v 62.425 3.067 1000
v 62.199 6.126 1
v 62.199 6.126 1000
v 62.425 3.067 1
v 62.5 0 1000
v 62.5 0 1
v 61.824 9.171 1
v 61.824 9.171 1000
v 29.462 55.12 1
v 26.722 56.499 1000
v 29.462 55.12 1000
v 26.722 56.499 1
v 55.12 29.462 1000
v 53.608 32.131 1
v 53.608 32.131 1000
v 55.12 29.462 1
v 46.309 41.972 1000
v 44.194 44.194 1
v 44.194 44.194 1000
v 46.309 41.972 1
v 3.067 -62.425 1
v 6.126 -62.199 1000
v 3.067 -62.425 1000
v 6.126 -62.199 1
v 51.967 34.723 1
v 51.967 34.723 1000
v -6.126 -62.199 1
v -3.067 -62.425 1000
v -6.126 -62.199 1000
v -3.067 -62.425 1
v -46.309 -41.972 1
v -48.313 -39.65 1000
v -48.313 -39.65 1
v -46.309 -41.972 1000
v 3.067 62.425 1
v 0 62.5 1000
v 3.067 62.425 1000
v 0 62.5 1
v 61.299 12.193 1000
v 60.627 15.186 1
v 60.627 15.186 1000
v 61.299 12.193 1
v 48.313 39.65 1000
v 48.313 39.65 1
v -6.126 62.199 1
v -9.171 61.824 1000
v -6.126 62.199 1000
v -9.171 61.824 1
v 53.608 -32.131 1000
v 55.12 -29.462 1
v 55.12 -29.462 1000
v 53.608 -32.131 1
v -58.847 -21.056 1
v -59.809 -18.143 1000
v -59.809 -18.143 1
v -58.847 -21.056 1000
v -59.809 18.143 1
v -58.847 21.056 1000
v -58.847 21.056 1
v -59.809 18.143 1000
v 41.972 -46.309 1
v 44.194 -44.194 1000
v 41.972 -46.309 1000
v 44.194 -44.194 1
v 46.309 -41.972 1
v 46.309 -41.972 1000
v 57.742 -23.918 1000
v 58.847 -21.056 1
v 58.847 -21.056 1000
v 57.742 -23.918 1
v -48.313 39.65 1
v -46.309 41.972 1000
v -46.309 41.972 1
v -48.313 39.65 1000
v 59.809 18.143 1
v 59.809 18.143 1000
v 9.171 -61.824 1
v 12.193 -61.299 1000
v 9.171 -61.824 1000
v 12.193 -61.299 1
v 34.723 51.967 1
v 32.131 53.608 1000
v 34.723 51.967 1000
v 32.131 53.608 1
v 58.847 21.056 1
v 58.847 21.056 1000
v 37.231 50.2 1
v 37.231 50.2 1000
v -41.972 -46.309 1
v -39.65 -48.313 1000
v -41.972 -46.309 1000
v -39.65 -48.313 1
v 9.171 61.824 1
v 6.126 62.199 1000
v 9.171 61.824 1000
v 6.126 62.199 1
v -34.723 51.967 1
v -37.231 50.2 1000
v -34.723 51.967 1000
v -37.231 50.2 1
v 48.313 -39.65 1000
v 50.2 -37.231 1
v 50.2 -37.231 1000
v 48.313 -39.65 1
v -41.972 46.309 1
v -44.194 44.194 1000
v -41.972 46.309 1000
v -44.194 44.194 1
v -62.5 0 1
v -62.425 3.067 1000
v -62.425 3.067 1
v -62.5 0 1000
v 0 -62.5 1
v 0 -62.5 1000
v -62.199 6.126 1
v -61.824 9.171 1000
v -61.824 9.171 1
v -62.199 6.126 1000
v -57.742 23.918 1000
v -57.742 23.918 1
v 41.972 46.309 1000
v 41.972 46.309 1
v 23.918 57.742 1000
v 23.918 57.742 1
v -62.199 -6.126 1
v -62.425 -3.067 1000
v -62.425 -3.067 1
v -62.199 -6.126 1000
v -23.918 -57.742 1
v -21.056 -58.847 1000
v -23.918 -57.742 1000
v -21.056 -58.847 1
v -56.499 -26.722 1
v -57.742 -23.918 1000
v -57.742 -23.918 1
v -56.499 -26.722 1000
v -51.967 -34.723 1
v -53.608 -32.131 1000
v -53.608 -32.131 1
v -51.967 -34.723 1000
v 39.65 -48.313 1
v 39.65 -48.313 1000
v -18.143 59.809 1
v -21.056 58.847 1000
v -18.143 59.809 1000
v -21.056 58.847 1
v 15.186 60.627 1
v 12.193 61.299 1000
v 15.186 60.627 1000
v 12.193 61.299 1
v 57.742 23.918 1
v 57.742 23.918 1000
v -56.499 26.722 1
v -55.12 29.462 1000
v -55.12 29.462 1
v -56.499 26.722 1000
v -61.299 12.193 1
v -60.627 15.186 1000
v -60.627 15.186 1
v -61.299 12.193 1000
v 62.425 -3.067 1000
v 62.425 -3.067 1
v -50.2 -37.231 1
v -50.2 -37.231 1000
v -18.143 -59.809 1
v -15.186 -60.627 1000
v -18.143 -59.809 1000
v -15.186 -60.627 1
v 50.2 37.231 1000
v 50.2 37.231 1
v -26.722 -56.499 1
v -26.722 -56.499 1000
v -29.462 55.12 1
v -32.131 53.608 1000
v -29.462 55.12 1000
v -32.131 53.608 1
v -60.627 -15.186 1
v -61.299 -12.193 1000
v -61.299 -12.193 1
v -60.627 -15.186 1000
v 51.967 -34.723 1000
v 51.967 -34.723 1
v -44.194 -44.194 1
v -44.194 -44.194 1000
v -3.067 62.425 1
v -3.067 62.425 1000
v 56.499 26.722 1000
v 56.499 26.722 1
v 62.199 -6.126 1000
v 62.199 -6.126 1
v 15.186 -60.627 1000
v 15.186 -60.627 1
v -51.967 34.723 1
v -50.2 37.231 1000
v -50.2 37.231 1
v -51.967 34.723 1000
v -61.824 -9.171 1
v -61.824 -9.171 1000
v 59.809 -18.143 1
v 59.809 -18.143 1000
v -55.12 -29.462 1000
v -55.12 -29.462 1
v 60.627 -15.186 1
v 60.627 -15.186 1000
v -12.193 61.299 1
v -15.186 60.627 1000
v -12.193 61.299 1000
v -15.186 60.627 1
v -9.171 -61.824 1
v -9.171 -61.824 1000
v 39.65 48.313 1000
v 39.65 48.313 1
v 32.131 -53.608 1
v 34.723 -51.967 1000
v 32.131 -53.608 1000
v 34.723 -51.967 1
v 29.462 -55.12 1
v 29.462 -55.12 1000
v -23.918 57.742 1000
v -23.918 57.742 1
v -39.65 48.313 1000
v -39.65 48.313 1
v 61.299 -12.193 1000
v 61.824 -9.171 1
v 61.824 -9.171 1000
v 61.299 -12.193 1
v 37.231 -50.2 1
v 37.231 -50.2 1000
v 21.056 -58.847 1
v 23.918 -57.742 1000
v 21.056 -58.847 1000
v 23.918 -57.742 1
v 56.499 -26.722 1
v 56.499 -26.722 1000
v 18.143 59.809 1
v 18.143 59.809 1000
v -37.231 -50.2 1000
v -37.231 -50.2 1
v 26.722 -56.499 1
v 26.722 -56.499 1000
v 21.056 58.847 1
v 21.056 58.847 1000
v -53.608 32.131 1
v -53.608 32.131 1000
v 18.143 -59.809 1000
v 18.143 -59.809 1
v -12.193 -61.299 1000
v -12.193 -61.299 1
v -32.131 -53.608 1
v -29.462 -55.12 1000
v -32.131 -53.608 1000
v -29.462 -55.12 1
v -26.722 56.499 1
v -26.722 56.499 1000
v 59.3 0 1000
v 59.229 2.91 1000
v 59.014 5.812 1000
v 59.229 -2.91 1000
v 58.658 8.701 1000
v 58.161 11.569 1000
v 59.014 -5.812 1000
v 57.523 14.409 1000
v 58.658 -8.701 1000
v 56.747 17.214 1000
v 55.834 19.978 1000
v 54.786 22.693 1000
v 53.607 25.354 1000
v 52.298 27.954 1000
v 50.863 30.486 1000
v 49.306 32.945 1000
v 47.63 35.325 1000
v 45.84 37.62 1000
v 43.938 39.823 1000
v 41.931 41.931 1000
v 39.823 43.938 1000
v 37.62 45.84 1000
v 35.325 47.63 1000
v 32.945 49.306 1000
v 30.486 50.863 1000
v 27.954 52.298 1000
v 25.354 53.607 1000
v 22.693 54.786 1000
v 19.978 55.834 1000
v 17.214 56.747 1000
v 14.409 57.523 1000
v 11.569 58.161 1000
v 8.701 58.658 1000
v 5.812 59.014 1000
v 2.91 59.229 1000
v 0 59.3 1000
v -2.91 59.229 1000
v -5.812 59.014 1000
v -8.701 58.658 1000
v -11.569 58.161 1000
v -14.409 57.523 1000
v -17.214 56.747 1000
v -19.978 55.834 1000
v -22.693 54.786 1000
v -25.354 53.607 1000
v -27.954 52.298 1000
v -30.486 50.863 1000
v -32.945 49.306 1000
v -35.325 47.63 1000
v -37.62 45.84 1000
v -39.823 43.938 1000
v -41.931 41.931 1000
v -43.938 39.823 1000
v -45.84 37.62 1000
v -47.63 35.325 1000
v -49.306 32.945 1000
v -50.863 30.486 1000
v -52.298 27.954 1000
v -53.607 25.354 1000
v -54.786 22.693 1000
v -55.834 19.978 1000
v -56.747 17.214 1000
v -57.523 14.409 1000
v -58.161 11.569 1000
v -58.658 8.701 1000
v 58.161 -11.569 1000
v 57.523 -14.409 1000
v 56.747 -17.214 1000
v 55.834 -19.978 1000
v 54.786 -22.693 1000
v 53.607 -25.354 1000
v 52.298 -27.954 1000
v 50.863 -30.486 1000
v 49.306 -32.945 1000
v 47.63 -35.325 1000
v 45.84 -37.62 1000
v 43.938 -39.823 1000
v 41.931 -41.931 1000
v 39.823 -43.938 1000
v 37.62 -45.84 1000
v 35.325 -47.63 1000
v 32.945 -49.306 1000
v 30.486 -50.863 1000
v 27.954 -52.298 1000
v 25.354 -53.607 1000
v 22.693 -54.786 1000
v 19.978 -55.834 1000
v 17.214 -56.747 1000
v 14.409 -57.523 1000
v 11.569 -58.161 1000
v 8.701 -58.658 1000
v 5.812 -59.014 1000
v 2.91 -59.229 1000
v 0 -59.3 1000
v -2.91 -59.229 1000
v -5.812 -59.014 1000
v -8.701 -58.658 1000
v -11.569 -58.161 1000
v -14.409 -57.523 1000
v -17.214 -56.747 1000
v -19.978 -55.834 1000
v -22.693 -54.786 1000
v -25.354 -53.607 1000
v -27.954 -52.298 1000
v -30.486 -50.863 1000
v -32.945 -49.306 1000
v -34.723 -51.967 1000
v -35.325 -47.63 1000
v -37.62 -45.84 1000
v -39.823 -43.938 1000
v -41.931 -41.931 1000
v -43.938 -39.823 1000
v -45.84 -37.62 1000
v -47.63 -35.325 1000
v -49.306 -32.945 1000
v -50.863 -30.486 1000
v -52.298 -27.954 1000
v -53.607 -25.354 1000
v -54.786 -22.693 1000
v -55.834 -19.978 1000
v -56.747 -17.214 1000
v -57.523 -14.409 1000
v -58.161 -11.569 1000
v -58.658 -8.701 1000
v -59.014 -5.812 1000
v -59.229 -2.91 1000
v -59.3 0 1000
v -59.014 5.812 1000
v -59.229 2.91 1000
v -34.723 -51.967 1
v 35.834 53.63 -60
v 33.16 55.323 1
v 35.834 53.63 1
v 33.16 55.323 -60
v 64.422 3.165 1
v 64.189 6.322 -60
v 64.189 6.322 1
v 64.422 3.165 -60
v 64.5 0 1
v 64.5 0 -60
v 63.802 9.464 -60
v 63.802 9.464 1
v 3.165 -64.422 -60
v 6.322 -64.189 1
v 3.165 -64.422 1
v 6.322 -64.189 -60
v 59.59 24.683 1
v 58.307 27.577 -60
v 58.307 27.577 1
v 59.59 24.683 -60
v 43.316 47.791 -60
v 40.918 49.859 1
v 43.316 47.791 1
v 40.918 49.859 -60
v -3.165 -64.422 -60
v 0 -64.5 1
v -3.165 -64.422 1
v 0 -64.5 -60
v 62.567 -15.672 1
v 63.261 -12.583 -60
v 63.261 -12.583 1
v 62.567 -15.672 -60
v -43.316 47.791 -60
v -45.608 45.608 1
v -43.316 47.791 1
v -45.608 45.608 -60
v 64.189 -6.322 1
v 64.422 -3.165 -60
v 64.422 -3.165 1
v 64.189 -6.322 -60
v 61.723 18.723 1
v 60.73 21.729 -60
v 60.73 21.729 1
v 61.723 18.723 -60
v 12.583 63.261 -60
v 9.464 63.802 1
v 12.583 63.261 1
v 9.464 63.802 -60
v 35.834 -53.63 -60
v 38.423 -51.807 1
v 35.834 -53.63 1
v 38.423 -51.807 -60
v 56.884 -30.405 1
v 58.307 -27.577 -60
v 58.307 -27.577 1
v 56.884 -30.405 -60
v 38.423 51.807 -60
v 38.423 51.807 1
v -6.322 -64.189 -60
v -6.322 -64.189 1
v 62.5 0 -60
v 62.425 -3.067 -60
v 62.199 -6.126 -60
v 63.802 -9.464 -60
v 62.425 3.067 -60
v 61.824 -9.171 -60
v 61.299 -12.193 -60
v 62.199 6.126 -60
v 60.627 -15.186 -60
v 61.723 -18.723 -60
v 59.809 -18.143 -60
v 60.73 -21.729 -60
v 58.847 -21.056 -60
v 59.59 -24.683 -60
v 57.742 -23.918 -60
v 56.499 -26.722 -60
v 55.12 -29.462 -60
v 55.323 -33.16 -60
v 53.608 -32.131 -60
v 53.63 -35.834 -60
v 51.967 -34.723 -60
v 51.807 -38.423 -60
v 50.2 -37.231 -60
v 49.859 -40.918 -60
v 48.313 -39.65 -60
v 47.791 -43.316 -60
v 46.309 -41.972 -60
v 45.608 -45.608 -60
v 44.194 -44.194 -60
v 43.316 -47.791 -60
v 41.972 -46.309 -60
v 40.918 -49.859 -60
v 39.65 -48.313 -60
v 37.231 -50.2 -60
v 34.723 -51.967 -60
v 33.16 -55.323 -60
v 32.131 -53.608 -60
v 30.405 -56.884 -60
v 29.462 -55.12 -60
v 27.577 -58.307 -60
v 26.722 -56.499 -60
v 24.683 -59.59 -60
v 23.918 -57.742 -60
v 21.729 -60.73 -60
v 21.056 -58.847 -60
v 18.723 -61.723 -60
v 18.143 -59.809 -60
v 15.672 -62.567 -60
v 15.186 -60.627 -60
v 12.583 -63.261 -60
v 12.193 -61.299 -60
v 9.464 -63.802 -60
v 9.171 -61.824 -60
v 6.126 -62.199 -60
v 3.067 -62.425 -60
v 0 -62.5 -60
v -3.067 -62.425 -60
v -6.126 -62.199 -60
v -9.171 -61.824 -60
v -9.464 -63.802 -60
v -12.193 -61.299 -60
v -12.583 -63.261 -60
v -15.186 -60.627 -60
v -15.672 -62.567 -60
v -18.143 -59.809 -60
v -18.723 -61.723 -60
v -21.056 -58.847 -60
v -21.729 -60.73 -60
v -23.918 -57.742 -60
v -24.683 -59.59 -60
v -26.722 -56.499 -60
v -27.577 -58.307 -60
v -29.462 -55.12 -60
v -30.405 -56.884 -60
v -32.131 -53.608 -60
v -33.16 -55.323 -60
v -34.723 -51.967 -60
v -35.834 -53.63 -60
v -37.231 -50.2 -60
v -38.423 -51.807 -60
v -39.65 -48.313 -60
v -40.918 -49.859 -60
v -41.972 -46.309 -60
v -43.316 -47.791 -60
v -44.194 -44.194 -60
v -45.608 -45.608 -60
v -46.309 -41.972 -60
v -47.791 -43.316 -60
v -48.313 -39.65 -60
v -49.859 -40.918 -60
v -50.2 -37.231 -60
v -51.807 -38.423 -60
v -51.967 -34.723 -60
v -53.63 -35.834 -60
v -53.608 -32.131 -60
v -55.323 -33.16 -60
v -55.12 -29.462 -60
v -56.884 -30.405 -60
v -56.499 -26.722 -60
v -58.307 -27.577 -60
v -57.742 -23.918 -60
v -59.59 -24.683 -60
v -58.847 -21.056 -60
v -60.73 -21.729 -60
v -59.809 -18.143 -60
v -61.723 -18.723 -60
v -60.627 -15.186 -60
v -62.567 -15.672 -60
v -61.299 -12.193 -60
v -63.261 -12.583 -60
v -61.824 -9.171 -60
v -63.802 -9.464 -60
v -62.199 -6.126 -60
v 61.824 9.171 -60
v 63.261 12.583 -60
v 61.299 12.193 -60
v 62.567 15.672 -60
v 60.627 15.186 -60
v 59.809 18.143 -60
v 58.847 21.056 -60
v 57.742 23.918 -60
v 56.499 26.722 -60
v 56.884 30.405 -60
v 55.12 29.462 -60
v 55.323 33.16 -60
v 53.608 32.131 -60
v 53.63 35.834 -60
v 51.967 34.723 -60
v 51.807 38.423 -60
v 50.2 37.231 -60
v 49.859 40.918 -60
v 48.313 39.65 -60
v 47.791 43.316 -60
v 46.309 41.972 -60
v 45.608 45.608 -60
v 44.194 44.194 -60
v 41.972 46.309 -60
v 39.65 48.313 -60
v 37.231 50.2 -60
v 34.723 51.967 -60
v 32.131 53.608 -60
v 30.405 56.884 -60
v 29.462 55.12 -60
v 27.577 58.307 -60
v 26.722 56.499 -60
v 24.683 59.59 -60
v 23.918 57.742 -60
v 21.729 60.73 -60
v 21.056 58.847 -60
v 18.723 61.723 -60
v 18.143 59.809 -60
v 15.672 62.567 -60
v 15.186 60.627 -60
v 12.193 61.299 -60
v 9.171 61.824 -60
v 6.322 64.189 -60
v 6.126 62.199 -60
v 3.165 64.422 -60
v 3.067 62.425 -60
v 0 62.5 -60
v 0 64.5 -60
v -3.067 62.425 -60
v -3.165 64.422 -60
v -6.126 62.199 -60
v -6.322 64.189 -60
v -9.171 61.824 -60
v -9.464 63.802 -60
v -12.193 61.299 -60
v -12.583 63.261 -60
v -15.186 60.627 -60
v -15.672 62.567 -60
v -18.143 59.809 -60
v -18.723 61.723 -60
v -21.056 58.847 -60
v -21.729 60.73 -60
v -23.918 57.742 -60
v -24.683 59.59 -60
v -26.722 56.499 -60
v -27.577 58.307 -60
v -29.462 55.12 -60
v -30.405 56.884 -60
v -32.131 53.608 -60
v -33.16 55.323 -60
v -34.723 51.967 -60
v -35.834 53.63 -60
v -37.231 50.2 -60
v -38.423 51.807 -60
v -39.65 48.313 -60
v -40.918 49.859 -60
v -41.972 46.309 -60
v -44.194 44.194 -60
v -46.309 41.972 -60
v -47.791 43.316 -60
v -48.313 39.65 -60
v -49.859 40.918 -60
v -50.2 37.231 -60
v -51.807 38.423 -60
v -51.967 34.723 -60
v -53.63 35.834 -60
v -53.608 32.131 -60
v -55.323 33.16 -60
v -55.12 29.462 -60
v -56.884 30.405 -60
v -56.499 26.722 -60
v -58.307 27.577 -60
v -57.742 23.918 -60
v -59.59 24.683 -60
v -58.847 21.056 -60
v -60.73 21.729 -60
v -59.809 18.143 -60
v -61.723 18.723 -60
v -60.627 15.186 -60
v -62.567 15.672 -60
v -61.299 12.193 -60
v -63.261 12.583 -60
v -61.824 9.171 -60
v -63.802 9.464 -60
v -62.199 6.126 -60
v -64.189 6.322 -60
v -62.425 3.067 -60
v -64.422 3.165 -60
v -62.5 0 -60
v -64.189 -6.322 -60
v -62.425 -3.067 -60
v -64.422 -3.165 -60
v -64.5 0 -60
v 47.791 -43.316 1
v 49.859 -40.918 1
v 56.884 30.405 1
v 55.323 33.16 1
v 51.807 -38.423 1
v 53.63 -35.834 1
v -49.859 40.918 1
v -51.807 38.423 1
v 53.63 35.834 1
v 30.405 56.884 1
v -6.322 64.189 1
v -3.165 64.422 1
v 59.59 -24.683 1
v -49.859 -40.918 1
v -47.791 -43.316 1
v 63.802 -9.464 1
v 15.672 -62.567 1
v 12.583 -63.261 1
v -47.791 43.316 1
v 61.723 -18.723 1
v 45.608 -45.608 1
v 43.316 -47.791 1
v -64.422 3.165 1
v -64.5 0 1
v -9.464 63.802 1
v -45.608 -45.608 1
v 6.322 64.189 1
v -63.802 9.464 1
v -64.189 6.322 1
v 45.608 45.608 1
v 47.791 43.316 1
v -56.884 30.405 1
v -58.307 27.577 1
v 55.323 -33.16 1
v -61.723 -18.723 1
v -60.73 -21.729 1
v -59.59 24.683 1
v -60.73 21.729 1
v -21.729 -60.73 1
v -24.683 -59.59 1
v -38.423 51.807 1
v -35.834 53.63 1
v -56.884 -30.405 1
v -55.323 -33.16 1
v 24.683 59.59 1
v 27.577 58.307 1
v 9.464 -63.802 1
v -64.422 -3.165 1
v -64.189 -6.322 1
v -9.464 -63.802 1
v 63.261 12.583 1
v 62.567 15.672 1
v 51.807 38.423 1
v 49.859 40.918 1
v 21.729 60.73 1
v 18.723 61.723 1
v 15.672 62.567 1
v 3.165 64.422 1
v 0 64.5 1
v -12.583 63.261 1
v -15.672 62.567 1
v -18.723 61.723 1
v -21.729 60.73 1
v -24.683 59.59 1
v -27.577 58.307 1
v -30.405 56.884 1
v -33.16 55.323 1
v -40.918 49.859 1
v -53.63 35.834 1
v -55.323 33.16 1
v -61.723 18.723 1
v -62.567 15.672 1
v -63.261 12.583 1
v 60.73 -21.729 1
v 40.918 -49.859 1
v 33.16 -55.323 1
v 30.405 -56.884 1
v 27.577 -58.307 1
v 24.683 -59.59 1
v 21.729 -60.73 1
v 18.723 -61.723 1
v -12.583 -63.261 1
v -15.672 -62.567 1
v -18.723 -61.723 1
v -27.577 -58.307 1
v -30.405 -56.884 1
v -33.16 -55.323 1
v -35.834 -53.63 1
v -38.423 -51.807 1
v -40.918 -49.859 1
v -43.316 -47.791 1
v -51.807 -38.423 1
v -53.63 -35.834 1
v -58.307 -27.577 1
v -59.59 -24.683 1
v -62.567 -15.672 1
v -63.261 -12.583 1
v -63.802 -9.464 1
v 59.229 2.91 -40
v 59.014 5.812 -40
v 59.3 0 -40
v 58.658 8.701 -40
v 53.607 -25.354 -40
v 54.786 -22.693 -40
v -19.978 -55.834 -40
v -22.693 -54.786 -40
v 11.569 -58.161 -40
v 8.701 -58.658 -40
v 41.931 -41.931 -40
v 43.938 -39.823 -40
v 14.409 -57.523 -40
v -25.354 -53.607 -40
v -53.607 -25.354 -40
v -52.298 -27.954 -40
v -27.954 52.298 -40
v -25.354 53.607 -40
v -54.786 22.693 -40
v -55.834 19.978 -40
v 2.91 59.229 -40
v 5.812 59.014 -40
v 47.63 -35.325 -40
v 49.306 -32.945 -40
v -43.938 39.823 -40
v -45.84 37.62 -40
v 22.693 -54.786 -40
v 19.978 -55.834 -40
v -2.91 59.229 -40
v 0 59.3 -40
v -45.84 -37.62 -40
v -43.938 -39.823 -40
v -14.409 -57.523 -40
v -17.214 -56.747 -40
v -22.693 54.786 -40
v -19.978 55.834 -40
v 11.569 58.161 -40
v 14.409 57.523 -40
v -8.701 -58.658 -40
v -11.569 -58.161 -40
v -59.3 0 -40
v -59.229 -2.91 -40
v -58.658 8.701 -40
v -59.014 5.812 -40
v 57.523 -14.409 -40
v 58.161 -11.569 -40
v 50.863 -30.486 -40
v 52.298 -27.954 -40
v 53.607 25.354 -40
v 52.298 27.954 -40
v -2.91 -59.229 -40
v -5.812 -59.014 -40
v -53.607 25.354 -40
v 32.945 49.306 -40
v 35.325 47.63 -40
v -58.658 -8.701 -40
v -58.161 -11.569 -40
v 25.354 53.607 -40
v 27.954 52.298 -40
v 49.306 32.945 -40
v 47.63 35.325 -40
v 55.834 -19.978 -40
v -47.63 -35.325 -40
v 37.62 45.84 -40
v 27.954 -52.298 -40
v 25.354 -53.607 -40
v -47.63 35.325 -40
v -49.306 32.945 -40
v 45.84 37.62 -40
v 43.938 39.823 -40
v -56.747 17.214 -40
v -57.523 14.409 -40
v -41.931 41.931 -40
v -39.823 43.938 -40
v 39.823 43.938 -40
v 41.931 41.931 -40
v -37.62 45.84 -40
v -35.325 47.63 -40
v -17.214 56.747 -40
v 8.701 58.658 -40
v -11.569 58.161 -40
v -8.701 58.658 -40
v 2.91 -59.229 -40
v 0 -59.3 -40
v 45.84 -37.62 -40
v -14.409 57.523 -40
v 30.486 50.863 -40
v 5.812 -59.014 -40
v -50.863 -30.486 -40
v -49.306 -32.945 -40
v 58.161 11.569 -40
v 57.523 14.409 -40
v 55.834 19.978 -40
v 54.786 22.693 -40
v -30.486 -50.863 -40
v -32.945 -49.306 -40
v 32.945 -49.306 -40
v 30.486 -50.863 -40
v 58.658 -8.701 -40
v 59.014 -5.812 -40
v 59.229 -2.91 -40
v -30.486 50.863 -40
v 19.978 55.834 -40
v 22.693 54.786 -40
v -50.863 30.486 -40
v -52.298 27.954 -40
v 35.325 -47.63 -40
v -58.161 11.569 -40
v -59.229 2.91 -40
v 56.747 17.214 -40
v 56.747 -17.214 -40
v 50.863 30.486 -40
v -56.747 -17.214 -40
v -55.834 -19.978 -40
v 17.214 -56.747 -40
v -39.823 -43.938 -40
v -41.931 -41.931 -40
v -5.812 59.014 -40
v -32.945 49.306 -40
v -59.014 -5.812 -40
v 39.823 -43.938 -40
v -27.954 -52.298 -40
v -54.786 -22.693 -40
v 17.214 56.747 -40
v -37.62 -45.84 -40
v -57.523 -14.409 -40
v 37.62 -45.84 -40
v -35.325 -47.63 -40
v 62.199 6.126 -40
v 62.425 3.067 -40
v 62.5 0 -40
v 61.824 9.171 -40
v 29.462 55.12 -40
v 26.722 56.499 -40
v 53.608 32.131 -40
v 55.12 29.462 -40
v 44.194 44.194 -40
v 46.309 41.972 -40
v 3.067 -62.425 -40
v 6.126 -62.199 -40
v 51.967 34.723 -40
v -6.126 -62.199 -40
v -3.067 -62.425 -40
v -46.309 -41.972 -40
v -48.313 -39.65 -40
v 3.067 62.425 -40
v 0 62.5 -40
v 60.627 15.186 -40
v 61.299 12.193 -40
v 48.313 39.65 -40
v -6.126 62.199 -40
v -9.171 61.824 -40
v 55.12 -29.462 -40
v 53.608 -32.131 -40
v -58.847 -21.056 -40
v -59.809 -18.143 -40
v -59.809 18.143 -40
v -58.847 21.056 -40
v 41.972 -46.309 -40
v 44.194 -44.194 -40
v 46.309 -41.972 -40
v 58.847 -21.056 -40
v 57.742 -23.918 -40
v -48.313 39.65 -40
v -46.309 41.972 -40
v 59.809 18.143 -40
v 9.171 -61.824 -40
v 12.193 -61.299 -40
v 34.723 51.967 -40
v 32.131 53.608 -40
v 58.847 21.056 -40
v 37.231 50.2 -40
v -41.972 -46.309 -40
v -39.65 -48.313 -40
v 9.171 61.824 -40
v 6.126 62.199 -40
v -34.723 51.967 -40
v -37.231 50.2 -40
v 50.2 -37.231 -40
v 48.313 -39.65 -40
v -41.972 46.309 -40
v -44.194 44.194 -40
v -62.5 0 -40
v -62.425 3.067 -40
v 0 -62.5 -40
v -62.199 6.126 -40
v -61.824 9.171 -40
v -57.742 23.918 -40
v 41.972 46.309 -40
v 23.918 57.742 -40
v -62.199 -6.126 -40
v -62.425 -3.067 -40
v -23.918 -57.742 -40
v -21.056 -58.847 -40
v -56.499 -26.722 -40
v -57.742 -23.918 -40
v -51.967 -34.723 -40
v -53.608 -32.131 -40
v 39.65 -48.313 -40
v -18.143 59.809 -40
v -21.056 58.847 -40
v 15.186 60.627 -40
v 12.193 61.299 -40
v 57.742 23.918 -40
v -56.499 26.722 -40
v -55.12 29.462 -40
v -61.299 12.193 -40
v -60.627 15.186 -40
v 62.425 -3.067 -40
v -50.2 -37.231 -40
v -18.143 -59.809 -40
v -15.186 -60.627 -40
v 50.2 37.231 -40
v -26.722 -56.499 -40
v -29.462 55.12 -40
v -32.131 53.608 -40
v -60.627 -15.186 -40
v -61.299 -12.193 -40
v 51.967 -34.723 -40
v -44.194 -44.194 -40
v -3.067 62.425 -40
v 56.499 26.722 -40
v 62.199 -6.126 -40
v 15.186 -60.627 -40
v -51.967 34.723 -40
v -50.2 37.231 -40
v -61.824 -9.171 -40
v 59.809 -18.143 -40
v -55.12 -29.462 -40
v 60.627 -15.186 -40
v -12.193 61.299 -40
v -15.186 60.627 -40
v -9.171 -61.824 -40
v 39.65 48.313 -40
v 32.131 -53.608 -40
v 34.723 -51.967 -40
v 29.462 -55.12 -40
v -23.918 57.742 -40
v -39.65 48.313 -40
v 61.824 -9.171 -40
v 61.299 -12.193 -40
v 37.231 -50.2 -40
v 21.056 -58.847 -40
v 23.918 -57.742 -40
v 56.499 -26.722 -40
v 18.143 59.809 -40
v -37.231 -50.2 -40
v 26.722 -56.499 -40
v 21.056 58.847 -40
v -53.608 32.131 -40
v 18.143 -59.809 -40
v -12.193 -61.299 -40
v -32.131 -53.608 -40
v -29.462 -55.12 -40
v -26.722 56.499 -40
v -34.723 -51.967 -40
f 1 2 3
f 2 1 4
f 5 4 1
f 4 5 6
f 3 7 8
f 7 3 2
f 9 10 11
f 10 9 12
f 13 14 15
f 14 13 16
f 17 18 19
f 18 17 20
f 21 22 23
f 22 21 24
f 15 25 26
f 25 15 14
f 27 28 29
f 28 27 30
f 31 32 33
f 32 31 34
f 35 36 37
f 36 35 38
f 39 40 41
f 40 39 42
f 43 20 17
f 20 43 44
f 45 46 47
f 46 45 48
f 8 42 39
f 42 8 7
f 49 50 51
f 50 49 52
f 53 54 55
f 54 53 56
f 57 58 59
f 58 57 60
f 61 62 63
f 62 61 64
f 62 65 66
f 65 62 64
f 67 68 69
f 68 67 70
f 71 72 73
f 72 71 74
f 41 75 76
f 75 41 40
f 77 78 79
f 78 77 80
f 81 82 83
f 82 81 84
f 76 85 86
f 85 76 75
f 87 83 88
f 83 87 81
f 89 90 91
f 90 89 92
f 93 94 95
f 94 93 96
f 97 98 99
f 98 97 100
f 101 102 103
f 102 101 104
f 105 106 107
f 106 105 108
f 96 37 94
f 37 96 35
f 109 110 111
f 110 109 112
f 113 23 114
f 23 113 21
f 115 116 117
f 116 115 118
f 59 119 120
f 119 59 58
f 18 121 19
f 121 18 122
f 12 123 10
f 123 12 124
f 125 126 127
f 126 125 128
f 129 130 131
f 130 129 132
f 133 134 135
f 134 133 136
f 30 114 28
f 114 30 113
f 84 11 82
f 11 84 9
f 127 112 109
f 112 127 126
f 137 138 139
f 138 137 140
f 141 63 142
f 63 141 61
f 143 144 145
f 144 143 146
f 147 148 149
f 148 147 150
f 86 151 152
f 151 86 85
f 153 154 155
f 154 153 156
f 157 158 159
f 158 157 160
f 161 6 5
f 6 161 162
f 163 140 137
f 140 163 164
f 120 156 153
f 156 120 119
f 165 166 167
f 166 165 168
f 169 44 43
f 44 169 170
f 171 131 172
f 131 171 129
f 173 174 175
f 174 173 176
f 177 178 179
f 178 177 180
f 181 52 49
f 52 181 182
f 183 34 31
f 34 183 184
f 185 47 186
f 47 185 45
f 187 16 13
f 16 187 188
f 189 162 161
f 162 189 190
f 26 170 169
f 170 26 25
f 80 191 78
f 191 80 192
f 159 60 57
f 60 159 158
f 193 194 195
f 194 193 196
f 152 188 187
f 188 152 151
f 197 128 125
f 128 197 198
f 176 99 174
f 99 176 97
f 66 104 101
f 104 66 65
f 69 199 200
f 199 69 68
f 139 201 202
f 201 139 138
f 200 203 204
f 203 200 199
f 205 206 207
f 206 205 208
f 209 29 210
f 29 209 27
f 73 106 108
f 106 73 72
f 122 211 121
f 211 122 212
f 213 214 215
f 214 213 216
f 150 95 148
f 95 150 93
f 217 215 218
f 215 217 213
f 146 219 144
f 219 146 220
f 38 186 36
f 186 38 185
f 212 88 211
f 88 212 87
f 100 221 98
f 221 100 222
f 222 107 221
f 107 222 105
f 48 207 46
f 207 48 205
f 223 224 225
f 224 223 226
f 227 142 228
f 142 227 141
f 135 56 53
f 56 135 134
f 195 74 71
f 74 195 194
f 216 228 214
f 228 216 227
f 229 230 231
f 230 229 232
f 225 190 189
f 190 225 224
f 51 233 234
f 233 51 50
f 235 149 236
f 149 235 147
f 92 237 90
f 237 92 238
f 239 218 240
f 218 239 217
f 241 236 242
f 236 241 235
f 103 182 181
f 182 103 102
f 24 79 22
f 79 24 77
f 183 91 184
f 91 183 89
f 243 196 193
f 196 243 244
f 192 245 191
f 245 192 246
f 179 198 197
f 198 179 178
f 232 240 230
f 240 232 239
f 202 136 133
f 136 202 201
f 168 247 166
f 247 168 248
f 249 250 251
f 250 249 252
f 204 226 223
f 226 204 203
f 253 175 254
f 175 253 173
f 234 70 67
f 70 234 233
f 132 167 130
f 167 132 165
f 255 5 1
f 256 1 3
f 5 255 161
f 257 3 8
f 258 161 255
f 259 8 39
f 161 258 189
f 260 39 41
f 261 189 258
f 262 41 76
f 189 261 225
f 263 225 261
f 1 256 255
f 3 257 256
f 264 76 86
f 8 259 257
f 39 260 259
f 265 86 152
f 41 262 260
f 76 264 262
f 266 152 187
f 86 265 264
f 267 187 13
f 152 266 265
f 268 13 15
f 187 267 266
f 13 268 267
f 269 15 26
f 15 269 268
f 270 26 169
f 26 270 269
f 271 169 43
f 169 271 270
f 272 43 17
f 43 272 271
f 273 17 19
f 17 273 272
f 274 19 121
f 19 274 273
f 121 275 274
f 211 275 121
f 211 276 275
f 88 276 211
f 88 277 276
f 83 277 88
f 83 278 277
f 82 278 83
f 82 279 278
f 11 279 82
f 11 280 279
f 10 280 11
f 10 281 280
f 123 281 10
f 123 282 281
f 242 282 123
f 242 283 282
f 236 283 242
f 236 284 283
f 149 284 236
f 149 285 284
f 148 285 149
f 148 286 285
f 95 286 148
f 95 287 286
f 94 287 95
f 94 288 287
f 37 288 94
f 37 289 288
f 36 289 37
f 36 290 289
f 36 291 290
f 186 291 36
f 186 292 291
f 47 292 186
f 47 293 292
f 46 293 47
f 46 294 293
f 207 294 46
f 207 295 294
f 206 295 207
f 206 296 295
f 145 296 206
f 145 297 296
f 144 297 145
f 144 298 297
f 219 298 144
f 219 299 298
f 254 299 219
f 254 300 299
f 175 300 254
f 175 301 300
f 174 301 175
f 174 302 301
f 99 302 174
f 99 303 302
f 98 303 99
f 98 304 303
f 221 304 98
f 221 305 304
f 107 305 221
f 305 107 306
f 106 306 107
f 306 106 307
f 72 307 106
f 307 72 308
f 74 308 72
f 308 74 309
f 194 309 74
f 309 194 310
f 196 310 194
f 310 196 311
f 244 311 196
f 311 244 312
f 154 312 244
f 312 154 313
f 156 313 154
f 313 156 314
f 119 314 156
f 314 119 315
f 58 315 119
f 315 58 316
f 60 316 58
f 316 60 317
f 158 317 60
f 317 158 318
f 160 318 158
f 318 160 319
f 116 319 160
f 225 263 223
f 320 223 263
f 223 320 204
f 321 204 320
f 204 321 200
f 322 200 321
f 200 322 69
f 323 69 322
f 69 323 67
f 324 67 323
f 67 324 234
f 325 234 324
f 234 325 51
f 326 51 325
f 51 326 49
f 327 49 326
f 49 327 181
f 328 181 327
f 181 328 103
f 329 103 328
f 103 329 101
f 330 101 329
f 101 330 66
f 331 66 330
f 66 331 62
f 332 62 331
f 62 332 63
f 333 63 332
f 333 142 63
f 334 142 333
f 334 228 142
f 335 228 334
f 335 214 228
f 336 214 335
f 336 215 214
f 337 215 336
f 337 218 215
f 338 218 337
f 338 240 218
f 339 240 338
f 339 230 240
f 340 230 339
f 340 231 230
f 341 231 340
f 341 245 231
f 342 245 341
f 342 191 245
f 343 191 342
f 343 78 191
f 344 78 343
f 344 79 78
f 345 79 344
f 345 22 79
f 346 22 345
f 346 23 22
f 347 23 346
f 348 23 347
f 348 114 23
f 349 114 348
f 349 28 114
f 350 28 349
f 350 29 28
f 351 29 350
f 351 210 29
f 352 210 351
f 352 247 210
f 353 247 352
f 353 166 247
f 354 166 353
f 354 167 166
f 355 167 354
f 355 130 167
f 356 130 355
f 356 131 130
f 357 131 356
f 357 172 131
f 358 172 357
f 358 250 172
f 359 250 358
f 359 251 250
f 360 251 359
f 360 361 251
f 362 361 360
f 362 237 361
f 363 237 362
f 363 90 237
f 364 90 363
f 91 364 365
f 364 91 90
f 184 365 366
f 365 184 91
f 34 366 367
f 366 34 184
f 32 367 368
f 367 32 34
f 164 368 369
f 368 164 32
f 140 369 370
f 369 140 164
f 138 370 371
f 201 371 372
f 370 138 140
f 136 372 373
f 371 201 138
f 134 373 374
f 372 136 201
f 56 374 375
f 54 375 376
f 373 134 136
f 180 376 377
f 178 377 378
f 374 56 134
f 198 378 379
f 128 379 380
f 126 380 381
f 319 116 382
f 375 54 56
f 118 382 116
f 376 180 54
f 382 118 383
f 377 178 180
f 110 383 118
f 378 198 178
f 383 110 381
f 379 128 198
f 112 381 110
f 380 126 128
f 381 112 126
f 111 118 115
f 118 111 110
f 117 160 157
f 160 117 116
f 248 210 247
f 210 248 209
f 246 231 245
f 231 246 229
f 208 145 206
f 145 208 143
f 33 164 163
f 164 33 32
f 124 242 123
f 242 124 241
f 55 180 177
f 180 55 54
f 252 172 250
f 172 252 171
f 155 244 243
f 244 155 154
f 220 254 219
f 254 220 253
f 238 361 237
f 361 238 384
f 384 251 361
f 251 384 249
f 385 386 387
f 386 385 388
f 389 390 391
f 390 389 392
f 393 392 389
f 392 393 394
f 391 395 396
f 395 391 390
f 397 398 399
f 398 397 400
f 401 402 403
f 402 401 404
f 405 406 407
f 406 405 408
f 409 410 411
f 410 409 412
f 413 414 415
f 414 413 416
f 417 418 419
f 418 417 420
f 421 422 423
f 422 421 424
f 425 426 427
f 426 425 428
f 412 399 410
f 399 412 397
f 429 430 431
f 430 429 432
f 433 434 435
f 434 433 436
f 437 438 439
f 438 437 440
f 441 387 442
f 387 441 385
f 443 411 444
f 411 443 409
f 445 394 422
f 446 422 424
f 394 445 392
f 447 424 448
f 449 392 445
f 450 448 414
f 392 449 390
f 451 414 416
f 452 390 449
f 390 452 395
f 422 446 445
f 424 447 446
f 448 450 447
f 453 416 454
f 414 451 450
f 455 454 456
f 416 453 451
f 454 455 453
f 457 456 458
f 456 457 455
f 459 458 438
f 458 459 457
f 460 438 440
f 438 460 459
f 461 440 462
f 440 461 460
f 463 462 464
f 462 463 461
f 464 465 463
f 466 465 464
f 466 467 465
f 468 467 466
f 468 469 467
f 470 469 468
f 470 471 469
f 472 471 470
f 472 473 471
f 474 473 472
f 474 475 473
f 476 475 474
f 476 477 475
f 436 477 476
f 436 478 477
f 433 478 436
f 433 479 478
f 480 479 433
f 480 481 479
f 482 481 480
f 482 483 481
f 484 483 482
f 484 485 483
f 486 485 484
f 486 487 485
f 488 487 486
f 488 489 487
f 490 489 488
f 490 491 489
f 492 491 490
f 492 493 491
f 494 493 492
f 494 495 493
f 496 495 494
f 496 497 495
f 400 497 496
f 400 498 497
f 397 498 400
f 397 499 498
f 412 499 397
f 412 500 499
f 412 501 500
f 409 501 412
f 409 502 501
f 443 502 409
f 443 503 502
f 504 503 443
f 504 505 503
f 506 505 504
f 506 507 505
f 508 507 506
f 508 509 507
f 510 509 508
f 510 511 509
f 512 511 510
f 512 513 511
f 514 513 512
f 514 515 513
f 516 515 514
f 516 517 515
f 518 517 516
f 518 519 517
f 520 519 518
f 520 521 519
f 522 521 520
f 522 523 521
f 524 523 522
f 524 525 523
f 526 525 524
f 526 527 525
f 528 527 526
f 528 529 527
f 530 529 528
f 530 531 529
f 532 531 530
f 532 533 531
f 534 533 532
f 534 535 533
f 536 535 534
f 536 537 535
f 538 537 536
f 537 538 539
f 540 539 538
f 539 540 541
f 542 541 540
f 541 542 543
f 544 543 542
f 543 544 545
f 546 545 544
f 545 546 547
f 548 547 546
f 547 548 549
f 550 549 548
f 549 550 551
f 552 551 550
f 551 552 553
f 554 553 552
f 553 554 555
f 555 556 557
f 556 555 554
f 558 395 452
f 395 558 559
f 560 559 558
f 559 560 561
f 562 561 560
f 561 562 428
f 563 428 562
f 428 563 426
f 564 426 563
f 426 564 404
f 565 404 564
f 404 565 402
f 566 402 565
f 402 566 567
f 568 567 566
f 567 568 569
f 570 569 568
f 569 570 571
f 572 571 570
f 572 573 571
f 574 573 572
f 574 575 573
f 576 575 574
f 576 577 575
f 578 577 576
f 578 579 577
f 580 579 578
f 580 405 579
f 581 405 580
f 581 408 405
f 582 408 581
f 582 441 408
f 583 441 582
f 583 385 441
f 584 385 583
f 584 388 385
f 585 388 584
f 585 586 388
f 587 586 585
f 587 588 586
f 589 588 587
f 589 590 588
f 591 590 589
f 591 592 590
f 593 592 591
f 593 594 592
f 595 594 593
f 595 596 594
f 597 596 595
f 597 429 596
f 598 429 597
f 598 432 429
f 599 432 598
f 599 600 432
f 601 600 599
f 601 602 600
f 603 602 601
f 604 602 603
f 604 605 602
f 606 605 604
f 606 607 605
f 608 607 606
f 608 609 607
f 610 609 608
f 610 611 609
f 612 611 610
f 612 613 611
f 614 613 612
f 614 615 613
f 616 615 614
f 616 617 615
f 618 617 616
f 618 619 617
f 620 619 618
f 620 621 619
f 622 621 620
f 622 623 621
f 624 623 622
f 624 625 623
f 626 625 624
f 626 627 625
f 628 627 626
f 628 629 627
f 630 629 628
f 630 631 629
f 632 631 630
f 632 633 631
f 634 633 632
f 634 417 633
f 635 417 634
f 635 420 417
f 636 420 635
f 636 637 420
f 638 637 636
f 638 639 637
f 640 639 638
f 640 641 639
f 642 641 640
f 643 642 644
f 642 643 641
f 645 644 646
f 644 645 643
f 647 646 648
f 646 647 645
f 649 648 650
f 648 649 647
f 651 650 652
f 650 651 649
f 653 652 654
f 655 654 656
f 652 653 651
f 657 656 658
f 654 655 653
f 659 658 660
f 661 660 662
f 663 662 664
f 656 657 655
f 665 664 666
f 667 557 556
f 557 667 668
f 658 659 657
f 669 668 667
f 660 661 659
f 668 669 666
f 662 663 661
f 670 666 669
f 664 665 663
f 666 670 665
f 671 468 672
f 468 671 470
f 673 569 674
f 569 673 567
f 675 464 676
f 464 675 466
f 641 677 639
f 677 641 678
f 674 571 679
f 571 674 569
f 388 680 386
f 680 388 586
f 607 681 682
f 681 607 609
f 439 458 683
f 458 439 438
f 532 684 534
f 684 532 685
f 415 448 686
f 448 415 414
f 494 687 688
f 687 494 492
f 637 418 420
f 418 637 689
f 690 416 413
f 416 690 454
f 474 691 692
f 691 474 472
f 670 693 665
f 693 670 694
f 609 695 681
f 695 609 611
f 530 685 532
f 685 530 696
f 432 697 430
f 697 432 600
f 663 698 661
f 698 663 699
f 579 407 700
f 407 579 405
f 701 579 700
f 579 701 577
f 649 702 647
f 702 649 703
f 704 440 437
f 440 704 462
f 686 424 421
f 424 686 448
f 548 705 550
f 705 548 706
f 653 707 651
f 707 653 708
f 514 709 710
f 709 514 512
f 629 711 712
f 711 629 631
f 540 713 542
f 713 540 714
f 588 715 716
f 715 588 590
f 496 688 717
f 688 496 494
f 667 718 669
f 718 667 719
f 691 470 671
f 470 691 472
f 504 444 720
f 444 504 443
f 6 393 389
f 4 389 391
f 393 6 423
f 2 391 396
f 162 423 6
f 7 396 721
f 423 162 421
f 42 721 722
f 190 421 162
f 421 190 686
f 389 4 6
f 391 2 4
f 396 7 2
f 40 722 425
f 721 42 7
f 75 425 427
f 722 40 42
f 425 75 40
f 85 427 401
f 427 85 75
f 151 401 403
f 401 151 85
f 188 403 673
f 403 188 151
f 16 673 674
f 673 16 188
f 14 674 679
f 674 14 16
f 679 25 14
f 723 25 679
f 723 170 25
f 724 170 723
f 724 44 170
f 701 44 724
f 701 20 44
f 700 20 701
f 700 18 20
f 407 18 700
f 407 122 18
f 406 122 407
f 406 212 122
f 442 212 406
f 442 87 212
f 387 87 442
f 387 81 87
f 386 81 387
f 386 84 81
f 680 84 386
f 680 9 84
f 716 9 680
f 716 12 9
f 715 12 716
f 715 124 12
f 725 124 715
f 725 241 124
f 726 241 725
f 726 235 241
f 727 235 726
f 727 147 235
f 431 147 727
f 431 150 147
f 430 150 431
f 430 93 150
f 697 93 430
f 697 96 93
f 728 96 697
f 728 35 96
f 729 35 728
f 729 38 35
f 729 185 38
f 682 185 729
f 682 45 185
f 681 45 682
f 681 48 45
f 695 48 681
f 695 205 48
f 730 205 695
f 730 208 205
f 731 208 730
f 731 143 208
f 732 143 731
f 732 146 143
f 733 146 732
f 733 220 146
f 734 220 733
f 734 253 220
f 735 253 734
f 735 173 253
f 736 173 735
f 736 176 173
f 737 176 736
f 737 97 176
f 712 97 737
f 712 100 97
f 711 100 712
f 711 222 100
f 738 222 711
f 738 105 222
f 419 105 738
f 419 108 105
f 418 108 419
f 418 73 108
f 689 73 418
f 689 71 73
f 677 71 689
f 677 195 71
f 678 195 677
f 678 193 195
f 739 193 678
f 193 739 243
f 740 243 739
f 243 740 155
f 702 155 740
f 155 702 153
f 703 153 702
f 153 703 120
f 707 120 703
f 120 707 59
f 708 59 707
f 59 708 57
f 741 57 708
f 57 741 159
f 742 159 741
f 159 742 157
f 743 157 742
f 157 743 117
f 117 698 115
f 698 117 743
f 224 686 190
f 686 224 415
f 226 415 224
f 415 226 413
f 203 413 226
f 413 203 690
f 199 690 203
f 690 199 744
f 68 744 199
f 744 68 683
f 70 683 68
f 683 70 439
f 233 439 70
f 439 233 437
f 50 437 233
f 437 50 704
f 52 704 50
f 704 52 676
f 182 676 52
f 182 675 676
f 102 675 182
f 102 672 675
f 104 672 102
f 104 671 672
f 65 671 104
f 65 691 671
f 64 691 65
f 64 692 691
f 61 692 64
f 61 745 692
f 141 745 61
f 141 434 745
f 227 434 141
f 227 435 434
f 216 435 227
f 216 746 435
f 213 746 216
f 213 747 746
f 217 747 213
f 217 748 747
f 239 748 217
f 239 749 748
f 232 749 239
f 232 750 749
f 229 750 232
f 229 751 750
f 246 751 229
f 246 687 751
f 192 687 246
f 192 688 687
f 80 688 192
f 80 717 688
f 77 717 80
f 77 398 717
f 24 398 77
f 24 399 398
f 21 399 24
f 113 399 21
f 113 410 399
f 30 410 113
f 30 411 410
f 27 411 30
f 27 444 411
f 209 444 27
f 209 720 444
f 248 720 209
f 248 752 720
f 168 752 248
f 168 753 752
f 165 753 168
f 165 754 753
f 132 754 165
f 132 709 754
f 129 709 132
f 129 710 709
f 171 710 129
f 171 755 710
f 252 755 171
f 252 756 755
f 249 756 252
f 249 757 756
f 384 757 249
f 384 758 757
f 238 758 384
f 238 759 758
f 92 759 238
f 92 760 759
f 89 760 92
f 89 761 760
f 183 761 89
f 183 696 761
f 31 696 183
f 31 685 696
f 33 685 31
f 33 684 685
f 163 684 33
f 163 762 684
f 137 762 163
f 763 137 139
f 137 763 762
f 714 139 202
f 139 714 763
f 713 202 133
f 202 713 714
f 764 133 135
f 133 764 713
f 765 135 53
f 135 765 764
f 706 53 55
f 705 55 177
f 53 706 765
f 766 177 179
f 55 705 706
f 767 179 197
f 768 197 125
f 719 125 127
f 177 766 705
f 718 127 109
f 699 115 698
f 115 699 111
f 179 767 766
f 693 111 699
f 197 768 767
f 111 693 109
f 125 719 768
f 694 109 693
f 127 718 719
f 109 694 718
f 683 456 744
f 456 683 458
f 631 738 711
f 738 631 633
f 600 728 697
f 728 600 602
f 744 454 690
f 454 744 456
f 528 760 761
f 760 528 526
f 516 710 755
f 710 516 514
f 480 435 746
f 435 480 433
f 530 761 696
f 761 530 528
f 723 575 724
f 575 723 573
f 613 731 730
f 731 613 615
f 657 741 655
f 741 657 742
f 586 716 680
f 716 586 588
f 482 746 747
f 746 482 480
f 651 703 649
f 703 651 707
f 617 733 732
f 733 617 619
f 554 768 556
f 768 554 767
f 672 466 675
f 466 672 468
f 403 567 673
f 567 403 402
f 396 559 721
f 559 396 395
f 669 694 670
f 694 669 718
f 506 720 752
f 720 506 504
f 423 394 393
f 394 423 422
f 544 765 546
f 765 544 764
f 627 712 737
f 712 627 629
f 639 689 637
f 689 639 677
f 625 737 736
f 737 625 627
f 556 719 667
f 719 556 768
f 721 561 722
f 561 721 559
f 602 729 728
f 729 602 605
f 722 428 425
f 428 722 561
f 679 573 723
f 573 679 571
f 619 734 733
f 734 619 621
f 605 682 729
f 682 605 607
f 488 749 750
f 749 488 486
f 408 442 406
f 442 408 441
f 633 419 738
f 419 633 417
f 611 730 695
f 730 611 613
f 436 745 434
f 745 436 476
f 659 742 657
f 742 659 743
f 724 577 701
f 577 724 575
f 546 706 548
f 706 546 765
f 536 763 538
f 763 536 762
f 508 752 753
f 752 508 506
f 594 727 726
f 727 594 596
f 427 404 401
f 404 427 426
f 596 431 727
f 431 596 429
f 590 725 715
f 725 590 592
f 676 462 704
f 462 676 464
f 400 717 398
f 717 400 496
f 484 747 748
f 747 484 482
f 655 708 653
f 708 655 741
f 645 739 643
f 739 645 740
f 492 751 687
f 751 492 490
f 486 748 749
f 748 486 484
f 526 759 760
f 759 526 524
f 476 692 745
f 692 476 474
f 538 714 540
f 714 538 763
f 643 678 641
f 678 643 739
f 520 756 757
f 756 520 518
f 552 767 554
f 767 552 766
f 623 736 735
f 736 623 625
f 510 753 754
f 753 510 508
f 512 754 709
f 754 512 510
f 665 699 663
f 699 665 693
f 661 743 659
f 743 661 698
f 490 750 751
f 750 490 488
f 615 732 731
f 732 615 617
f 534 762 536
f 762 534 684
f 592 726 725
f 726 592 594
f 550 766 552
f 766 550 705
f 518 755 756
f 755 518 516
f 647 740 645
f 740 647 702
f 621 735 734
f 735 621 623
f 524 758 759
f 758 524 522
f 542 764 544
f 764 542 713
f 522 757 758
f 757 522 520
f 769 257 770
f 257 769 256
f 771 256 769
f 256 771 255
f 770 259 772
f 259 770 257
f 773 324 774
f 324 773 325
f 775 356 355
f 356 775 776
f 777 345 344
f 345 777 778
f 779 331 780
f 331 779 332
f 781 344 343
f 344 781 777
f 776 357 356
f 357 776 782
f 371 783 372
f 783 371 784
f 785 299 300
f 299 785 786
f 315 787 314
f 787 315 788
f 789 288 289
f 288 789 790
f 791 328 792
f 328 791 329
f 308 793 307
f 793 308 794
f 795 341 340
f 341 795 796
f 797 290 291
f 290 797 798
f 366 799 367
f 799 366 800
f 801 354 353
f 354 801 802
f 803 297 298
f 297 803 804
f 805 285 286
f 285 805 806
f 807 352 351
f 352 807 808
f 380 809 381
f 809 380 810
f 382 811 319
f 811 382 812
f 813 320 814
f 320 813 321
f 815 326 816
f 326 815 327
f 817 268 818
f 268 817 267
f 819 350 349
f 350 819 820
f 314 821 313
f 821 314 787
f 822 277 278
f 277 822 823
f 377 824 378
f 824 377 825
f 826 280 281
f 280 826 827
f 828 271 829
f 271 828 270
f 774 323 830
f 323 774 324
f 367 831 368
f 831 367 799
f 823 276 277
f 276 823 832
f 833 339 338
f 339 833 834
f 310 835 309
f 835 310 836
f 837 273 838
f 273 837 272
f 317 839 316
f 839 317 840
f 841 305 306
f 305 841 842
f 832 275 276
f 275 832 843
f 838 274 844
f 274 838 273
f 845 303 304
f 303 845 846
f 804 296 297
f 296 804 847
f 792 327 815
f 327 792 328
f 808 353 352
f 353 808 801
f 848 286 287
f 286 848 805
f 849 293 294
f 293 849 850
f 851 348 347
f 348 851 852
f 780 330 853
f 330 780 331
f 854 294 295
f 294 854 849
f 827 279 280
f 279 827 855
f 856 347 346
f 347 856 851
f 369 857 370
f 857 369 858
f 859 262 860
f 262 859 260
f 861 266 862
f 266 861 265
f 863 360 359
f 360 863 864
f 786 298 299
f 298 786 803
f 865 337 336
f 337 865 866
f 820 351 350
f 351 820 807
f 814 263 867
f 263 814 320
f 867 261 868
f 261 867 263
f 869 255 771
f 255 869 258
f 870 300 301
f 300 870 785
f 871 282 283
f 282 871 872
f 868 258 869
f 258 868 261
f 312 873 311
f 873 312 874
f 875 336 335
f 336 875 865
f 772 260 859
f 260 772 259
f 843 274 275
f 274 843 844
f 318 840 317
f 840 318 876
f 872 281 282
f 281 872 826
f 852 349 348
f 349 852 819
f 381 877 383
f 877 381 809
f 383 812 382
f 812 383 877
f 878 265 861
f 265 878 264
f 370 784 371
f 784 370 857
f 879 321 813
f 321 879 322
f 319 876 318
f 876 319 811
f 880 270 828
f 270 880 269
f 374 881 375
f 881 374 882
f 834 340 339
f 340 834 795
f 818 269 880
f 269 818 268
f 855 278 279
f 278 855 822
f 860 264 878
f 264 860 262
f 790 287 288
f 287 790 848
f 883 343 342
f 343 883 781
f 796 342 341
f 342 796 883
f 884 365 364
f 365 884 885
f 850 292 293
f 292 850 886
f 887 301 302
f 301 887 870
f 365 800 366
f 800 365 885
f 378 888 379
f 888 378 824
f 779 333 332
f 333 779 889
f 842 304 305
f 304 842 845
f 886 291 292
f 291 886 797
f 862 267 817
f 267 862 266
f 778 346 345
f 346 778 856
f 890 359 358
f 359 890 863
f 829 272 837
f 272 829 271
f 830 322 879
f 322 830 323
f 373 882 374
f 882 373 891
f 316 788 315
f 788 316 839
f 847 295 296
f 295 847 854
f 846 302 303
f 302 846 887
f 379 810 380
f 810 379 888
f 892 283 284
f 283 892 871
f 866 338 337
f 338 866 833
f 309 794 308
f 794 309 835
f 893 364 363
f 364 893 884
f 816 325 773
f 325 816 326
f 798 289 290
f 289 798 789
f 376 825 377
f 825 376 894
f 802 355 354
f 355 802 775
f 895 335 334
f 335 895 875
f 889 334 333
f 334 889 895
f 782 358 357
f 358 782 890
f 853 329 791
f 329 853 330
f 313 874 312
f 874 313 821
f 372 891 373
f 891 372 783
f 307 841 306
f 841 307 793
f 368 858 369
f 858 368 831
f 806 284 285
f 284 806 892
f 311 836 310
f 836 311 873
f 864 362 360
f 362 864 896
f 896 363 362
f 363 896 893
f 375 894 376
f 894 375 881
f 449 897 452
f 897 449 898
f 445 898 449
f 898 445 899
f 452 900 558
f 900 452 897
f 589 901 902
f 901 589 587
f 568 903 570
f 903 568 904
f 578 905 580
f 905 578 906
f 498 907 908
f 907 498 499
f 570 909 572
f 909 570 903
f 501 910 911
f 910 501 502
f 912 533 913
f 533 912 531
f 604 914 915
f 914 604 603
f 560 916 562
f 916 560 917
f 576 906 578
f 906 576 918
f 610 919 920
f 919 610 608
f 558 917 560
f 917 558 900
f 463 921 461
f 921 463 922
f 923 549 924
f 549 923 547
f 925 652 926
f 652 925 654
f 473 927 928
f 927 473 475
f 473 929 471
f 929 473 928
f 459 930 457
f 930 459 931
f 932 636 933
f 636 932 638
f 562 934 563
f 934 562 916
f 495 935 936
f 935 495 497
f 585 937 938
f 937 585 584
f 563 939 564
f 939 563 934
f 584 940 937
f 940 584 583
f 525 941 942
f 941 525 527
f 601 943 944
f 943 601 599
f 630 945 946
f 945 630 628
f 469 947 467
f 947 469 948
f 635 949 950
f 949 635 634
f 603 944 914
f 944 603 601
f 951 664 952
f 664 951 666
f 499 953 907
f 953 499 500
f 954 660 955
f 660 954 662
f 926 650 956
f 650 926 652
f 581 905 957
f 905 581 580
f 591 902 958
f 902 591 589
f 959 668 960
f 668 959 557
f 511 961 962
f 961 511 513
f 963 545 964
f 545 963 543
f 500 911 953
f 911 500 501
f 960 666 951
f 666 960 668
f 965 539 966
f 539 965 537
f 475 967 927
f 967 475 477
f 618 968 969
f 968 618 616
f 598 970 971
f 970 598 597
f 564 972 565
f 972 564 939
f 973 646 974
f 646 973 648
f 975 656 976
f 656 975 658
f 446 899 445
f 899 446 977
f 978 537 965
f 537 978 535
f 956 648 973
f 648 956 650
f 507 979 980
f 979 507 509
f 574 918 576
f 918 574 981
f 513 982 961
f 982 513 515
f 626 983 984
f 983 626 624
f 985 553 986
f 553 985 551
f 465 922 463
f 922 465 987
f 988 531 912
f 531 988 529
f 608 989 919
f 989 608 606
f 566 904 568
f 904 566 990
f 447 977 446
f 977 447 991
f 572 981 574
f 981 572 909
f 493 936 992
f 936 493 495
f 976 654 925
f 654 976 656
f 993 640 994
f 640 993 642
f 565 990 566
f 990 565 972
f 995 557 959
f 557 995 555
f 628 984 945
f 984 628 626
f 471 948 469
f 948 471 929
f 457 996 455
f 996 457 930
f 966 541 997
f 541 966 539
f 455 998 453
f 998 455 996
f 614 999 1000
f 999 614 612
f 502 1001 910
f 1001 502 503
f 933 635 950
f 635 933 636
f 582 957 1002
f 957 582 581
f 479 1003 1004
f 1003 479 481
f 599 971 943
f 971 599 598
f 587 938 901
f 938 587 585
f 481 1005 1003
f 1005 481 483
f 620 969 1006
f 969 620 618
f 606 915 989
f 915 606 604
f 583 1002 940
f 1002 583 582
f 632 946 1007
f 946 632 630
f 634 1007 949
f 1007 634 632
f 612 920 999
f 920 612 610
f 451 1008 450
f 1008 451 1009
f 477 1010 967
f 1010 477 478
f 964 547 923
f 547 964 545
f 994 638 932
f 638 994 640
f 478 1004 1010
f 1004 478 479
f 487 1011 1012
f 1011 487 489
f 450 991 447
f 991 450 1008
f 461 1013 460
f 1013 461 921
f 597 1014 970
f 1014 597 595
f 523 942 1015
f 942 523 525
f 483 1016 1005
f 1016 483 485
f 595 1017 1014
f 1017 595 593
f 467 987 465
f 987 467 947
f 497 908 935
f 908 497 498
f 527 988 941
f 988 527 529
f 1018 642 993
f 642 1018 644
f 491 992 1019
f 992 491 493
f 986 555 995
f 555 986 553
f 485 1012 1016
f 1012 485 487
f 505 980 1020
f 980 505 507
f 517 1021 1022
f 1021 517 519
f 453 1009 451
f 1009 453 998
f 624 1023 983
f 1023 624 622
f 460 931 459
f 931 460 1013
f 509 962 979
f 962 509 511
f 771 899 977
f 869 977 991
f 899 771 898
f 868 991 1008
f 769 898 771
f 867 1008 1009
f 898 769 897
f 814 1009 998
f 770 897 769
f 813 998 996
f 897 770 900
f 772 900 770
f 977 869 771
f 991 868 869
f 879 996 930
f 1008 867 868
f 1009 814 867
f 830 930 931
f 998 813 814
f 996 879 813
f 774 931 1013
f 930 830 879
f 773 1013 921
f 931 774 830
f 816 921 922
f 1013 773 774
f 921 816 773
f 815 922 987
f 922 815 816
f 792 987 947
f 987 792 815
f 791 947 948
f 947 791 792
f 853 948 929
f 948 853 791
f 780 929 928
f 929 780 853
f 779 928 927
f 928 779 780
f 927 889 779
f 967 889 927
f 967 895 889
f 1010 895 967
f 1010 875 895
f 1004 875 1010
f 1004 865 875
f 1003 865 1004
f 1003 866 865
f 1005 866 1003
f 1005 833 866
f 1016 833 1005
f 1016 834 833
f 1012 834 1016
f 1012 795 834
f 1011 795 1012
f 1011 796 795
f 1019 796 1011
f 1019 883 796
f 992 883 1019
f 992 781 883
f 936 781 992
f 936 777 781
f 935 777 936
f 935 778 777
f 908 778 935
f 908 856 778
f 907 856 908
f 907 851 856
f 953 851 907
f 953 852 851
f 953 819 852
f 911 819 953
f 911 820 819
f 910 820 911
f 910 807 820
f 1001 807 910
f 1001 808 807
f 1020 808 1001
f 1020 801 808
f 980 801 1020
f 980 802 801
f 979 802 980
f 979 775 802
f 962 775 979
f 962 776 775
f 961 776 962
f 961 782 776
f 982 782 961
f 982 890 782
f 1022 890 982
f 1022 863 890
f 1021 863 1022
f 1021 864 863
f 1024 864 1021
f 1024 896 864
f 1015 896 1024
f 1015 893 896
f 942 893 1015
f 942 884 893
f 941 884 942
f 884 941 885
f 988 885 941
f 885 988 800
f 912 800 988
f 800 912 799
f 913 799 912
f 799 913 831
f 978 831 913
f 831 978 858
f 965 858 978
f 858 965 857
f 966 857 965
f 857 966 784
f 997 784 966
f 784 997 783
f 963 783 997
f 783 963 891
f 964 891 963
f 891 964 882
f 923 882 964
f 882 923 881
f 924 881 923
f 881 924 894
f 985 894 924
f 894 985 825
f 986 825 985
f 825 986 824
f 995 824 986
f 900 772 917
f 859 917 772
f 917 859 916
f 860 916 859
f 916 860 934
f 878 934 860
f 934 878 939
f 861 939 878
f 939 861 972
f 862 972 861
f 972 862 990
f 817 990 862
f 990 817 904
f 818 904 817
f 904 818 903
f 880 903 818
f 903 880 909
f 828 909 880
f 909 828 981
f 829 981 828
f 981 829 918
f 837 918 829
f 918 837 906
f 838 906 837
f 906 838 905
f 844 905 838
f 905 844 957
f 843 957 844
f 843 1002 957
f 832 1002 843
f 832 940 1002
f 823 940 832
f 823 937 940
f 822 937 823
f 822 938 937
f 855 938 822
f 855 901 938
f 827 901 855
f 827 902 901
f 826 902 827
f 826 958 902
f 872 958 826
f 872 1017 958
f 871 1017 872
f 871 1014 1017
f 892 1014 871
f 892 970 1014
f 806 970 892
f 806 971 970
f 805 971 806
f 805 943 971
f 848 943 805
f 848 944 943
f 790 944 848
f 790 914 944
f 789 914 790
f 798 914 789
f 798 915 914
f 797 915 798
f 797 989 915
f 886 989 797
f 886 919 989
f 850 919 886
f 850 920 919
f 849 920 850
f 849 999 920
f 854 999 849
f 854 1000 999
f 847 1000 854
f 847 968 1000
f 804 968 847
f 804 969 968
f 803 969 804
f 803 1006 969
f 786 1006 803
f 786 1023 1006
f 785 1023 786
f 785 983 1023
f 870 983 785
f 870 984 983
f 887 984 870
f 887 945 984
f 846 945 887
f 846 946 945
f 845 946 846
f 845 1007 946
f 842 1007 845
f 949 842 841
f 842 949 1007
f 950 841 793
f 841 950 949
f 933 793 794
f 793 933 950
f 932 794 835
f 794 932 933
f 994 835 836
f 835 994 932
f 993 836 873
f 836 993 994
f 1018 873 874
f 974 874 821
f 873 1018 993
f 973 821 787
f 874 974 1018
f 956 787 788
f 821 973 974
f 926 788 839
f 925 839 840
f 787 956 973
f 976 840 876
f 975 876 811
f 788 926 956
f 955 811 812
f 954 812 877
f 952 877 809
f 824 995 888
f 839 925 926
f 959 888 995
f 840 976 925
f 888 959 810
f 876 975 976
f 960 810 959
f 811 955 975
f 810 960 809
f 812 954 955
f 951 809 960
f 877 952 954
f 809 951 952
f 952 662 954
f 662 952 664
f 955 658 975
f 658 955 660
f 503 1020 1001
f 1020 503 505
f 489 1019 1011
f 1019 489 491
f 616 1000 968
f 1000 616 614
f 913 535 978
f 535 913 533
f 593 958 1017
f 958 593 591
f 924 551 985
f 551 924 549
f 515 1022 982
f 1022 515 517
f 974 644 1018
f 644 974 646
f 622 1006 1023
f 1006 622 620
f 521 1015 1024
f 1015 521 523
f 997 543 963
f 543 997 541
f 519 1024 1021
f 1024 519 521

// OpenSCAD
// HT 125 pipe 1000 mm (socketed end) - one connected solid

// Parameters
pipe_standard = 1; //[1:1:1]
nominal_diameter_mm = 125; //[63:250:1]
length_mm = 1000; //[500:2000:10]
pipe_od_mm = 125; //[63:250:1]
pipe_wall_mm = 3.2; //[1.6:6.4:0.1]
fitting_length_mm = 60; //[30:120:1]
fitting_wall_extra_mm = 2.0; //[0.5:6.0:0.1]
fitting_stop_thickness_mm = 4; //[2:10:1]
fitting_stop_depth_mm = 20; //[10:60:1]
overlap_mm = 1; //[0.5:2:0.1]

$fn = 128;

module ht_pipe() {
    pipe_r   = pipe_od_mm/2;
    bore_r   = pipe_r - pipe_wall_mm;
    fitting_r = pipe_r + fitting_wall_extra_mm;

    // Z layout (pipe runs from z=0..length_mm, socket extends to negative Z)
    z_pipe0 = 0;
    z_pipe1 = length_mm;

    z_fit0  = -fitting_length_mm;
    z_fit1  = 0;

    // Stop ring location inside socket
    z_stop0 = z_fit0 + fitting_stop_depth_mm;
    z_stop1 = z_stop0 + fitting_stop_thickness_mm;

    // Safety: ensure valid radii
    assert(bore_r > 0, "pipe_wall_mm too large: bore radius <= 0");
    assert(fitting_stop_depth_mm + fitting_stop_thickness_mm <= fitting_length_mm,
           "Stop ring exceeds socket length");

    color([0.85, 0.85, 0.8])
    difference() {
        // OUTER SOLID (connected union)
        union() {
            // Main pipe outer
            translate([0,0,z_pipe0])
                cylinder(h=length_mm, r=pipe_r, center=false);

            // Socket outer (overlap into pipe to guarantee connectivity)
            translate([0,0,z_fit0])
                cylinder(h=fitting_length_mm + overlap_mm, r=fitting_r, center=false);

            // Stop ring material (adds internal shoulder)
            translate([0,0,z_stop0])
                cylinder(h=fitting_stop_thickness_mm, r=pipe_r, center=false);
        }

        // INNER VOID (continuous)
        union() {
            // Through-bore (extend beyond ends to avoid coplanar faces)
            translate([0,0,z_fit0 - overlap_mm])
                cylinder(h=(length_mm + fitting_length_mm) + 2*overlap_mm, r=bore_r, center=false);

            // Socket cavity (female end) up to the stop ring
            translate([0,0,z_fit0 - overlap_mm])
                cylinder(h=fitting_stop_depth_mm + overlap_mm, r=pipe_r, center=false);
        }
    }
}

ht_pipe();
